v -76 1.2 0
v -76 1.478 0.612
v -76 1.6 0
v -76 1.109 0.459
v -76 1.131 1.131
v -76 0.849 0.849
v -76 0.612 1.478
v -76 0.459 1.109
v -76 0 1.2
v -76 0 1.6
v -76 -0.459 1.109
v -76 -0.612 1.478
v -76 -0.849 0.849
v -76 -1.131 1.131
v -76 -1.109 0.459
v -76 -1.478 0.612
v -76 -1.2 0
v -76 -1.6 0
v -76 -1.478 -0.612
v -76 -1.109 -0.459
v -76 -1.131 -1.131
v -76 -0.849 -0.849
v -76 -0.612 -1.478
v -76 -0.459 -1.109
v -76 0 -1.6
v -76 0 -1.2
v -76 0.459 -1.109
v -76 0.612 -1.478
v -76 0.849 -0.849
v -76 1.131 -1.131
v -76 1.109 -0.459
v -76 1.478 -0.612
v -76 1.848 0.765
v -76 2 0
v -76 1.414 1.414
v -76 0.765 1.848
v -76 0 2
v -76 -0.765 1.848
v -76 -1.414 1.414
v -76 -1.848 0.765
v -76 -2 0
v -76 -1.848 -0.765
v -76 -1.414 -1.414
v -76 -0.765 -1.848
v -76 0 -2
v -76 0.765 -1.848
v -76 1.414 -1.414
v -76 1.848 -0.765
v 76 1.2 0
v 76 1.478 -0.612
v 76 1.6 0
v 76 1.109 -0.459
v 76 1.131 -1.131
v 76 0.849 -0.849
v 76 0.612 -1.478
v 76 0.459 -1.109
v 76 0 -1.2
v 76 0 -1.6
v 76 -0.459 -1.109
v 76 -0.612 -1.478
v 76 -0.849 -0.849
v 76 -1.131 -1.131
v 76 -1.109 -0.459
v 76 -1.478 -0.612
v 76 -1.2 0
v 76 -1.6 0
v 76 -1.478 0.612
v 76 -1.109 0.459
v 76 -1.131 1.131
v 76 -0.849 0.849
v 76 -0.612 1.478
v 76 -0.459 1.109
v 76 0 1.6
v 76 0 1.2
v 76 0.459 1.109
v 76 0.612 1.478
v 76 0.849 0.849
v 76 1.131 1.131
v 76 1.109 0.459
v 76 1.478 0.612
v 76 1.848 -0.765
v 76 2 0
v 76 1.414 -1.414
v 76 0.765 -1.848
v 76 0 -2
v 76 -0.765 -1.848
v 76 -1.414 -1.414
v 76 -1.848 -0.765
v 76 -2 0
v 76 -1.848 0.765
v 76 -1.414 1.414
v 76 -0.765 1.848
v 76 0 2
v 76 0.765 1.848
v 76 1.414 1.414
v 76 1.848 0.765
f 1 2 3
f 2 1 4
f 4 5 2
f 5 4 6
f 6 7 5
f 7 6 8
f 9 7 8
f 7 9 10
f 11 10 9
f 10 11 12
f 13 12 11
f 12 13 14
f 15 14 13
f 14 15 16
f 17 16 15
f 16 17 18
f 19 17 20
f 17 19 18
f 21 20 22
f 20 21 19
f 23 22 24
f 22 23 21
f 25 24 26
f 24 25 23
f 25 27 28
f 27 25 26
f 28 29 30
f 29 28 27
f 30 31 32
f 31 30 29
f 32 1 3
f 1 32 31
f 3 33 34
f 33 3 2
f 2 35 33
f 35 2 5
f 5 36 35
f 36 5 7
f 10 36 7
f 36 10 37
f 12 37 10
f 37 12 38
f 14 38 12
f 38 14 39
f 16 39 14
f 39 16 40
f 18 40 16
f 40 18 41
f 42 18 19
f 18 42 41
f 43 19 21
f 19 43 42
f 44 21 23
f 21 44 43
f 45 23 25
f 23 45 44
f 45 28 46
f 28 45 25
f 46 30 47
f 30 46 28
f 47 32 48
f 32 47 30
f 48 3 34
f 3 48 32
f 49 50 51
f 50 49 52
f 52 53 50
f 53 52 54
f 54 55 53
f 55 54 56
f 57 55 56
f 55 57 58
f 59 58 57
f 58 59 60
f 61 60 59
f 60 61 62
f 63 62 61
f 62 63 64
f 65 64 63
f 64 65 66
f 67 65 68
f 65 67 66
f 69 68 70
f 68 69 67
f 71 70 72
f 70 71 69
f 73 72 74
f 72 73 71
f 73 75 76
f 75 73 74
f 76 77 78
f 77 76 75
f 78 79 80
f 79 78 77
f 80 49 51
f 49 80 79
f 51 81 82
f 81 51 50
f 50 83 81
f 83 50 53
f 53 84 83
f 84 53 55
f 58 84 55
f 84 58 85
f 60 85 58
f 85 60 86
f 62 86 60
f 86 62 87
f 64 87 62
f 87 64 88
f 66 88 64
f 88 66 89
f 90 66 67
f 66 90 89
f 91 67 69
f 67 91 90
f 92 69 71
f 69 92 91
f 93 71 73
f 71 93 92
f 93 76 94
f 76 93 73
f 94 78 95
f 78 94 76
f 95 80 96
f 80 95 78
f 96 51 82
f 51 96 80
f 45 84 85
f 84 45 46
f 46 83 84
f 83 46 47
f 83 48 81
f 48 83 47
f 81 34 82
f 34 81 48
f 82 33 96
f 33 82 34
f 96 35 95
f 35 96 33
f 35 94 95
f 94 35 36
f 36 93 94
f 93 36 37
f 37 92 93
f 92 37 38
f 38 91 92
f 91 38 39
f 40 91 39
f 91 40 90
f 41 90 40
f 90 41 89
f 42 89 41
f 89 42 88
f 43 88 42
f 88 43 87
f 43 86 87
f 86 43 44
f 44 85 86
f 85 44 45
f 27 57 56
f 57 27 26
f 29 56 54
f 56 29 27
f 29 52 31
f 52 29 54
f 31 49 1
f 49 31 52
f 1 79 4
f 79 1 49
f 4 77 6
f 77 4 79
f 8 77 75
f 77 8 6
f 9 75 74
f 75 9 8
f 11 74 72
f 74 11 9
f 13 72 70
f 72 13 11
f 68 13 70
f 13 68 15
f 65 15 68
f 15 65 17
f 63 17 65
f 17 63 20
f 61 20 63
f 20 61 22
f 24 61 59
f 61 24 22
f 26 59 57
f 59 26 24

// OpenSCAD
// file: ../p/4-4cyli.scad
use <../lib.scad>
function ldraw_lib__4_4cyli() = [
// 0 Cylinder 1.0
// 0 Name: 4-4cyli.dat
// 0 Author: James Jessiman
// 0 !LDRAW_ORG Primitive UPDATE 2005-01
// 0 !LICENSE Licensed under CC BY 2.0 and CC BY 4.0 : see CAreadme.txt
// 
// 0 BFC CERTIFY CCW
  [0,"BFC","CERTIFY"],
  [0,"BFC","CCW"],
// 
// 0 !HISTORY 1998-12-15 [PTadmin] Official Update 1998-10
// 0 !HISTORY 2002-03-23 [sbliss] Added BFC statement; merged headers from files in distributions LDraw 0.27 and Complete.
// 0 !HISTORY 2002-04-25 [PTadmin] Official Update 2002-02
// 0 !HISTORY 2004-12-14 [guyvivan] BFC CCW
// 0 !HISTORY 2005-12-28 [PTadmin] Official Update 2005-01
// 0 !HISTORY 2007-06-24 [PTadmin] Header formatted for Contributor Agreement
// 0 !HISTORY 2008-07-01 [PTadmin] Official Update 2008-01
// 
// 
// 4 16 1 1 0 0.9239 1 0.3827 0.9239 0 0.3827 1 0 0
  [4,16,1,1,0,0.9239,1,0.3827,0.9239,0,0.3827,1,0,0],
// 5 24 1 0 0 1 1 0 0.9239 0 0.3827 0.9239 0 -0.3827
  [5,24,1,0,0,1,1,0,0.9239,0,0.3827,0.9239,0,-0.3827],
// 4 16 0.9239 1 0.3827 0.7071 1 0.7071 0.7071 0 0.7071 0.9239 0 0.3827
  [4,16,0.9239,1,0.3827,0.7071,1,0.7071,0.7071,0,0.7071,0.9239,0,0.3827],
// 5 24 0.9239 0 0.3827 0.9239 1 0.3827 0.7071 0 0.7071 1 0 0
  [5,24,0.9239,0,0.3827,0.9239,1,0.3827,0.7071,0,0.7071,1,0,0],
// 4 16 0.7071 1 0.7071 0.3827 1 0.9239 0.3827 0 0.9239 0.7071 0 0.7071
  [4,16,0.7071,1,0.7071,0.3827,1,0.9239,0.3827,0,0.9239,0.7071,0,0.7071],
// 5 24 0.7071 0 0.7071 0.7071 1 0.7071 0.3827 0 0.9239 0.9239 0 0.3827
  [5,24,0.7071,0,0.7071,0.7071,1,0.7071,0.3827,0,0.9239,0.9239,0,0.3827],
// 4 16 0.3827 1 0.9239 0 1 1 0 0 1 0.3827 0 0.9239
  [4,16,0.3827,1,0.9239,0,1,1,0,0,1,0.3827,0,0.9239],
// 5 24 0.3827 0 0.9239 0.3827 1 0.9239 0 0 1 0.7071 0 0.7071
  [5,24,0.3827,0,0.9239,0.3827,1,0.9239,0,0,1,0.7071,0,0.7071],
// 4 16 0 1 1 -0.3827 1 0.9239 -0.3827 0 0.9239 0 0 1
  [4,16,0,1,1,-0.3827,1,0.9239,-0.3827,0,0.9239,0,0,1],
// 5 24 0 0 1 0 1 1 -0.3827 0 0.9239 0.3827 0 0.9239
  [5,24,0,0,1,0,1,1,-0.3827,0,0.9239,0.3827,0,0.9239],
// 4 16 -0.3827 1 0.9239 -0.7071 1 0.7071 -0.7071 0 0.7071 -0.3827 0 0.9239
  [4,16,-0.3827,1,0.9239,-0.7071,1,0.7071,-0.7071,0,0.7071,-0.3827,0,0.9239],
// 5 24 -0.3827 0 0.9239 -0.3827 1 0.9239 -0.7071 0 0.7071 0 0 1
  [5,24,-0.3827,0,0.9239,-0.3827,1,0.9239,-0.7071,0,0.7071,0,0,1],
// 4 16 -0.7071 1 0.7071 -0.9239 1 0.3827 -0.9239 0 0.3827 -0.7071 0 0.7071
  [4,16,-0.7071,1,0.7071,-0.9239,1,0.3827,-0.9239,0,0.3827,-0.7071,0,0.7071],
// 5 24 -0.7071 0 0.7071 -0.7071 1 0.7071 -0.9239 0 0.3827 -0.3827 0 0.9239
  [5,24,-0.7071,0,0.7071,-0.7071,1,0.7071,-0.9239,0,0.3827,-0.3827,0,0.9239],
// 4 16 -0.9239 1 0.3827 -1 1 0 -1 0 0 -0.9239 0 0.3827
  [4,16,-0.9239,1,0.3827,-1,1,0,-1,0,0,-0.9239,0,0.3827],
// 5 24 -0.9239 0 0.3827 -0.9239 1 0.3827 -1 0 0 -0.7071 0 0.7071
  [5,24,-0.9239,0,0.3827,-0.9239,1,0.3827,-1,0,0,-0.7071,0,0.7071],
// 4 16 -1 1 0 -0.9239 1 -0.3827 -0.9239 0 -0.3827 -1 0 0
  [4,16,-1,1,0,-0.9239,1,-0.3827,-0.9239,0,-0.3827,-1,0,0],
// 5 24 -1 0 0 -1 1 0 -0.9239 0 -0.3827 -0.9239 0 0.3827
  [5,24,-1,0,0,-1,1,0,-0.9239,0,-0.3827,-0.9239,0,0.3827],
// 4 16 -0.9239 1 -0.3827 -0.7071 1 -0.7071 -0.7071 0 -0.7071 -0.9239 0 -0.3827
  [4,16,-0.9239,1,-0.3827,-0.7071,1,-0.7071,-0.7071,0,-0.7071,-0.9239,0,-0.3827],
// 5 24 -0.9239 0 -0.3827 -0.9239 1 -0.3827 -0.7071 0 -0.7071 -1 0 0
  [5,24,-0.9239,0,-0.3827,-0.9239,1,-0.3827,-0.7071,0,-0.7071,-1,0,0],
// 4 16 -0.7071 1 -0.7071 -0.3827 1 -0.9239 -0.3827 0 -0.9239 -0.7071 0 -0.7071
  [4,16,-0.7071,1,-0.7071,-0.3827,1,-0.9239,-0.3827,0,-0.9239,-0.7071,0,-0.7071],
// 5 24 -0.7071 0 -0.7071 -0.7071 1 -0.7071 -0.3827 0 -0.9239 -0.9239 0 -0.3827
  [5,24,-0.7071,0,-0.7071,-0.7071,1,-0.7071,-0.3827,0,-0.9239,-0.9239,0,-0.3827],
// 4 16 -0.3827 1 -0.9239 0 1 -1 0 0 -1 -0.3827 0 -0.9239
  [4,16,-0.3827,1,-0.9239,0,1,-1,0,0,-1,-0.3827,0,-0.9239],
// 5 24 -0.3827 0 -0.9239 -0.3827 1 -0.9239 0 0 -1 -0.7071 0 -0.7071
  [5,24,-0.3827,0,-0.9239,-0.3827,1,-0.9239,0,0,-1,-0.7071,0,-0.7071],
// 4 16 0 1 -1 0.3827 1 -0.9239 0.3827 0 -0.9239 0 0 -1
  [4,16,0,1,-1,0.3827,1,-0.9239,0.3827,0,-0.9239,0,0,-1],
// 5 24 0 0 -1 0 1 -1 0.3827 0 -0.9239 -0.3827 0 -0.9239
  [5,24,0,0,-1,0,1,-1,0.3827,0,-0.9239,-0.3827,0,-0.9239],
// 4 16 0.3827 1 -0.9239 0.7071 1 -0.7071 0.7071 0 -0.7071 0.3827 0 -0.9239
  [4,16,0.3827,1,-0.9239,0.7071,1,-0.7071,0.7071,0,-0.7071,0.3827,0,-0.9239],
// 5 24 0.3827 0 -0.9239 0.3827 1 -0.9239 0.7071 0 -0.7071 0 0 -1
  [5,24,0.3827,0,-0.9239,0.3827,1,-0.9239,0.7071,0,-0.7071,0,0,-1],
// 4 16 0.7071 1 -0.7071 0.9239 1 -0.3827 0.9239 0 -0.3827 0.7071 0 -0.7071
  [4,16,0.7071,1,-0.7071,0.9239,1,-0.3827,0.9239,0,-0.3827,0.7071,0,-0.7071],
// 5 24 0.7071 0 -0.7071 0.7071 1 -0.7071 0.9239 0 -0.3827 0.3827 0 -0.9239
  [5,24,0.7071,0,-0.7071,0.7071,1,-0.7071,0.9239,0,-0.3827,0.3827,0,-0.9239],
// 4 16 0.9239 1 -0.3827 1 1 0 1 0 0 0.9239 0 -0.3827
  [4,16,0.9239,1,-0.3827,1,1,0,1,0,0,0.9239,0,-0.3827],
// 5 24 0.9239 0 -0.3827 0.9239 1 -0.3827 1 0 0 0.7071 0 -0.7071
  [5,24,0.9239,0,-0.3827,0.9239,1,-0.3827,1,0,0,0.7071,0,-0.7071],
// 0
];
makepoly(ldraw_lib__4_4cyli(), line=0.2);
// file: ../p/4-4ring4.scad
use <../lib.scad>
function ldraw_lib__4_4ring4() = [
// 0 Ring  4 x 1.0
// 0 Name: 4-4ring4.dat
// 0 Author: James Jessiman
// 0 !LDRAW_ORG Primitive UPDATE 2009-01
// 0 !LICENSE Licensed under CC BY 2.0 and CC BY 4.0 : see CAreadme.txt
// 
// 0 BFC CERTIFY CCW
  [0,"BFC","CERTIFY"],
  [0,"BFC","CCW"],
// 
// 0 !HISTORY 1998-12-15 [PTadmin] Official Update 1998-10
// 0 !HISTORY 2002-04-08 [BrickCaster] Modified for BFC compliance
// 0 !HISTORY 2002-04-25 [PTadmin] Official Update 2002-02
// 0 !HISTORY 2007-06-24 [PTadmin] Header formatted for Contributor Agreement
// 0 !HISTORY 2008-07-01 [PTadmin] Official Update 2008-01
// 0 !HISTORY 2008-08-26 [cwdee] Switch polygon winding and rename
// 0 !HISTORY 2009-05-02 [PTadmin] Official Update 2009-01
// 
// 
// 4 16 -1.9135 0 4.6195 -1.5308 0 3.6956 0 0 4 0 0 5
  [4,16,-1.9135,0,4.6195,-1.5308,0,3.6956,0,0,4,0,0,5],
// 4 16 -3.5355 0 3.5355 -2.8284 0 2.8284 -1.5308 0 3.6956 -1.9135 0 4.6195
  [4,16,-3.5355,0,3.5355,-2.8284,0,2.8284,-1.5308,0,3.6956,-1.9135,0,4.6195],
// 4 16 -4.6195 0 1.9135 -3.6956 0 1.5308 -2.8284 0 2.8284 -3.5355 0 3.5355
  [4,16,-4.6195,0,1.9135,-3.6956,0,1.5308,-2.8284,0,2.8284,-3.5355,0,3.5355],
// 4 16 -5 0 0 -4 0 0 -3.6956 0 1.5308 -4.6195 0 1.9135
  [4,16,-5,0,0,-4,0,0,-3.6956,0,1.5308,-4.6195,0,1.9135],
// 4 16 -4.6195 0 -1.9135 -3.6956 0 -1.5308 -4 0 0 -5 0 0
  [4,16,-4.6195,0,-1.9135,-3.6956,0,-1.5308,-4,0,0,-5,0,0],
// 4 16 -3.5355 0 -3.5355 -2.8284 0 -2.8284 -3.6956 0 -1.5308 -4.6195 0 -1.9135
  [4,16,-3.5355,0,-3.5355,-2.8284,0,-2.8284,-3.6956,0,-1.5308,-4.6195,0,-1.9135],
// 4 16 -1.9135 0 -4.6195 -1.5308 0 -3.6956 -2.8284 0 -2.8284 -3.5355 0 -3.5355
  [4,16,-1.9135,0,-4.6195,-1.5308,0,-3.6956,-2.8284,0,-2.8284,-3.5355,0,-3.5355],
// 4 16 0 0 -5 0 0 -4 -1.5308 0 -3.6956 -1.9135 0 -4.6195
  [4,16,0,0,-5,0,0,-4,-1.5308,0,-3.6956,-1.9135,0,-4.6195],
// 4 16 1.9135 0 -4.6195 1.5308 0 -3.6956 0 0 -4 0 0 -5
  [4,16,1.9135,0,-4.6195,1.5308,0,-3.6956,0,0,-4,0,0,-5],
// 4 16 3.5355 0 -3.5355 2.8284 0 -2.8284 1.5308 0 -3.6956 1.9135 0 -4.6195
  [4,16,3.5355,0,-3.5355,2.8284,0,-2.8284,1.5308,0,-3.6956,1.9135,0,-4.6195],
// 4 16 4.6195 0 -1.9135 3.6956 0 -1.5308 2.8284 0 -2.8284 3.5355 0 -3.5355
  [4,16,4.6195,0,-1.9135,3.6956,0,-1.5308,2.8284,0,-2.8284,3.5355,0,-3.5355],
// 4 16 5 0 0 4 0 0 3.6956 0 -1.5308 4.6195 0 -1.9135
  [4,16,5,0,0,4,0,0,3.6956,0,-1.5308,4.6195,0,-1.9135],
// 4 16 4.6195 0 1.9135 3.6956 0 1.5308 4 0 0 5 0 0
  [4,16,4.6195,0,1.9135,3.6956,0,1.5308,4,0,0,5,0,0],
// 4 16 3.5355 0 3.5355 2.8284 0 2.8284 3.6956 0 1.5308 4.6195 0 1.9135
  [4,16,3.5355,0,3.5355,2.8284,0,2.8284,3.6956,0,1.5308,4.6195,0,1.9135],
// 4 16 1.9135 0 4.6195 1.5308 0 3.6956 2.8284 0 2.8284 3.5355 0 3.5355
  [4,16,1.9135,0,4.6195,1.5308,0,3.6956,2.8284,0,2.8284,3.5355,0,3.5355],
// 4 16 0 0 5 0 0 4 1.5308 0 3.6956 1.9135 0 4.6195
  [4,16,0,0,5,0,0,4,1.5308,0,3.6956,1.9135,0,4.6195],
// 0
];
makepoly(ldraw_lib__4_4ring4(), line=0.2);
// file: ../p/4-4ring3.scad
use <../lib.scad>
function ldraw_lib__4_4ring3() = [
// 0 Ring  3 x 1.0
// 0 Name: 4-4ring3.dat
// 0 Author: James Jessiman
// 0 !LDRAW_ORG Primitive UPDATE 2009-01
// 0 !LICENSE Licensed under CC BY 2.0 and CC BY 4.0 : see CAreadme.txt
// 
// 0 BFC CERTIFY CCW
  [0,"BFC","CERTIFY"],
  [0,"BFC","CCW"],
// 
// 0 !HISTORY 1998-12-15 [PTadmin] Official Update 1998-10
// 0 !HISTORY 2002-04-05 [hafhead] Added BFC statement
// 0 !HISTORY 2002-04-25 [PTadmin] Official Update 2002-02
// 0 !HISTORY 2007-06-24 [PTadmin] Header formatted for Contributor Agreement
// 0 !HISTORY 2008-07-01 [PTadmin] Official Update 2008-01
// 0 !HISTORY 2008-08-26 [cwdee] Switch polygon winding and rename
// 0 !HISTORY 2009-05-02 [PTadmin] Official Update 2009-01
// 
// 
// 4 16 -1.5308 0 3.6956 -1.1481 0 2.7717 0 0 3 0 0 4
  [4,16,-1.5308,0,3.6956,-1.1481,0,2.7717,0,0,3,0,0,4],
// 4 16 -2.8284 0 2.8284 -2.1213 0 2.1213 -1.1481 0 2.7717 -1.5308 0 3.6956
  [4,16,-2.8284,0,2.8284,-2.1213,0,2.1213,-1.1481,0,2.7717,-1.5308,0,3.6956],
// 4 16 -3.6956 0 1.5308 -2.7717 0 1.1481 -2.1213 0 2.1213 -2.8284 0 2.8284
  [4,16,-3.6956,0,1.5308,-2.7717,0,1.1481,-2.1213,0,2.1213,-2.8284,0,2.8284],
// 4 16 -4 0 0 -3 0 0 -2.7717 0 1.1481 -3.6956 0 1.5308
  [4,16,-4,0,0,-3,0,0,-2.7717,0,1.1481,-3.6956,0,1.5308],
// 4 16 -3.6956 0 -1.5308 -2.7717 0 -1.1481 -3 0 0 -4 0 0
  [4,16,-3.6956,0,-1.5308,-2.7717,0,-1.1481,-3,0,0,-4,0,0],
// 4 16 -2.8284 0 -2.8284 -2.1213 0 -2.1213 -2.7717 0 -1.1481 -3.6956 0 -1.5308
  [4,16,-2.8284,0,-2.8284,-2.1213,0,-2.1213,-2.7717,0,-1.1481,-3.6956,0,-1.5308],
// 4 16 -1.5308 0 -3.6956 -1.1481 0 -2.7717 -2.1213 0 -2.1213 -2.8284 0 -2.8284
  [4,16,-1.5308,0,-3.6956,-1.1481,0,-2.7717,-2.1213,0,-2.1213,-2.8284,0,-2.8284],
// 4 16 0 0 -4 0 0 -3 -1.1481 0 -2.7717 -1.5308 0 -3.6956
  [4,16,0,0,-4,0,0,-3,-1.1481,0,-2.7717,-1.5308,0,-3.6956],
// 4 16 1.5308 0 -3.6956 1.1481 0 -2.7717 0 0 -3 0 0 -4
  [4,16,1.5308,0,-3.6956,1.1481,0,-2.7717,0,0,-3,0,0,-4],
// 4 16 2.8284 0 -2.8284 2.1213 0 -2.1213 1.1481 0 -2.7717 1.5308 0 -3.6956
  [4,16,2.8284,0,-2.8284,2.1213,0,-2.1213,1.1481,0,-2.7717,1.5308,0,-3.6956],
// 4 16 3.6956 0 -1.5308 2.7717 0 -1.1481 2.1213 0 -2.1213 2.8284 0 -2.8284
  [4,16,3.6956,0,-1.5308,2.7717,0,-1.1481,2.1213,0,-2.1213,2.8284,0,-2.8284],
// 4 16 4 0 0 3 0 0 2.7717 0 -1.1481 3.6956 0 -1.5308
  [4,16,4,0,0,3,0,0,2.7717,0,-1.1481,3.6956,0,-1.5308],
// 4 16 3.6956 0 1.5308 2.7717 0 1.1481 3 0 0 4 0 0
  [4,16,3.6956,0,1.5308,2.7717,0,1.1481,3,0,0,4,0,0],
// 4 16 2.8284 0 2.8284 2.1213 0 2.1213 2.7717 0 1.1481 3.6956 0 1.5308
  [4,16,2.8284,0,2.8284,2.1213,0,2.1213,2.7717,0,1.1481,3.6956,0,1.5308],
// 4 16 1.5308 0 3.6956 1.1481 0 2.7717 2.1213 0 2.1213 2.8284 0 2.8284
  [4,16,1.5308,0,3.6956,1.1481,0,2.7717,2.1213,0,2.1213,2.8284,0,2.8284],
// 4 16 0 0 4 0 0 3 1.1481 0 2.7717 1.5308 0 3.6956
  [4,16,0,0,4,0,0,3,1.1481,0,2.7717,1.5308,0,3.6956],
// 0
];
makepoly(ldraw_lib__4_4ring3(), line=0.2);
// file: ../p/4-4edge.scad
use <../lib.scad>
function ldraw_lib__4_4edge() = [
// 0 Circle 1.0
// 0 Name: 4-4edge.dat
// 0 Author: James Jessiman
// 0 !LDRAW_ORG Primitive UPDATE 2017-01
// 0 !LICENSE Licensed under CC BY 2.0 and CC BY 4.0 : see CAreadme.txt
// 
// 0 BFC CERTIFY CCW
  [0,"BFC","CERTIFY"],
  [0,"BFC","CCW"],
// 
// 0 !HISTORY 1998-12-15 [PTadmin] Official Update 1998-10
// 0 !HISTORY 2005-12-28 [PTadmin] Official Update 2005-01
// 0 !HISTORY 2007-06-24 [PTadmin] Header formatted for Contributor Agreement
// 0 !HISTORY 2008-07-01 [PTadmin] Official Update 2008-01
// 0 !HISTORY 2017-01-15 [Steffen] BFCed
// 0 !HISTORY 2017-12-30 [PTadmin] Official Update 2017-01
// 
// 
// 2 24 1 0 0 0.9239 0 0.3827
  [2,24,1,0,0,0.9239,0,0.3827],
// 2 24 0.9239 0 0.3827 0.7071 0 0.7071
  [2,24,0.9239,0,0.3827,0.7071,0,0.7071],
// 2 24 0.7071 0 0.7071 0.3827 0 0.9239
  [2,24,0.7071,0,0.7071,0.3827,0,0.9239],
// 2 24 0.3827 0 0.9239 0 0 1
  [2,24,0.3827,0,0.9239,0,0,1],
// 2 24 0 0 1 -0.3827 0 0.9239
  [2,24,0,0,1,-0.3827,0,0.9239],
// 2 24 -0.3827 0 0.9239 -0.7071 0 0.7071
  [2,24,-0.3827,0,0.9239,-0.7071,0,0.7071],
// 2 24 -0.7071 0 0.7071 -0.9239 0 0.3827
  [2,24,-0.7071,0,0.7071,-0.9239,0,0.3827],
// 2 24 -0.9239 0 0.3827 -1 0 -0
  [2,24,-0.9239,0,0.3827,-1,0,-0],
// 2 24 -1 0 -0 -0.9239 0 -0.3827
  [2,24,-1,0,-0,-0.9239,0,-0.3827],
// 2 24 -0.9239 0 -0.3827 -0.7071 0 -0.7071
  [2,24,-0.9239,0,-0.3827,-0.7071,0,-0.7071],
// 2 24 -0.7071 0 -0.7071 -0.3827 0 -0.9239
  [2,24,-0.7071,0,-0.7071,-0.3827,0,-0.9239],
// 2 24 -0.3827 0 -0.9239 0 0 -1
  [2,24,-0.3827,0,-0.9239,0,0,-1],
// 2 24 0 0 -1 0.3827 0 -0.9239
  [2,24,0,0,-1,0.3827,0,-0.9239],
// 2 24 0.3827 0 -0.9239 0.7071 0 -0.7071
  [2,24,0.3827,0,-0.9239,0.7071,0,-0.7071],
// 2 24 0.7071 0 -0.7071 0.9239 0 -0.3827
  [2,24,0.7071,0,-0.7071,0.9239,0,-0.3827],
// 2 24 0.9239 0 -0.3827 1 0 0
  [2,24,0.9239,0,-0.3827,1,0,0],
];
makepoly(ldraw_lib__4_4edge(), line=0.2);
// file: 71533k03.scad
use <../lib.scad>
use <../p/4-4cyli.scad>
function ldraw_lib__71533k03() = [
// 0 ~Technic Pneumatic Tube Segment
// 0 Name: 71533k03.dat
// 0 Author: Jaco van der Molen [Jaco]
// 0 !LDRAW_ORG Part Flexible_Section UPDATE 2020-01
// 0 !LICENSE Licensed under CC BY 2.0 and CC BY 4.0 : see CAreadme.txt
// 
// 0 BFC CERTIFY CW
  [0,"BFC","CERTIFY"],
  [0,"BFC","CW"],
// 
// 0 !HISTORY 2003-11-30 [Steffen] BFCed
// 0 !HISTORY 2009-12-29 [PTadmin] Official Update 2009-03
// 0 !HISTORY 2020-06-27 [PTadmin] Renamed from 166
// 0 !HISTORY 2020-06-28 [PTadmin] Official Update 2020-01
// 
// 
// 1 16 0 0 0 5 0 0 0 1 0 0 0 5 4-4cyli.dat
  [1,16,0,0,0,5,0,0,0,1,0,0,0,5, ldraw_lib__4_4cyli()],
// 0 BFC INVERTNEXT
  [0,"BFC","INVERTNEXT"],
// 1 16 0 0 0 3 0 0 0 1 0 0 0 3 4-4cyli.dat
  [1,16,0,0,0,3,0,0,0,1,0,0,0,3, ldraw_lib__4_4cyli()],
// 0
];
makepoly(ldraw_lib__71533k03(), line=0.2);
// file: 71533k02.scad
use <../lib.scad>
use <../p/4-4edge.scad>
use <../p/4-4ring3.scad>
use <../p/4-4ring4.scad>
function ldraw_lib__71533k02() = [
// 0 ~Technic Pneumatic Tube End (Non-Bulged)
// 0 Name: 71533k02.dat
// 0 Author: Steffen [Steffen]
// 0 !LDRAW_ORG Part Flexible_Section UPDATE 2020-01
// 0 !LICENSE Licensed under CC BY 2.0 and CC BY 4.0 : see CAreadme.txt
// 
// 0 BFC CERTIFY CCW
  [0,"BFC","CERTIFY"],
  [0,"BFC","CCW"],
// 
// 0 !HISTORY 2020-06-28 [PTadmin] Official Update 2020-01
// 
// 
// 0 // This file goes together with 71533k01.dat and 71533k03.dat.
// 0 // Those 3 files can be used to create Technic Pneumatic Tubes
// 0 // with either bulged or non-bulged ends.
// 
// 1 16 0 0 0 1 0 0 0 1 0 0 0 1 4-4ring3.dat
  [1,16,0,0,0,1,0,0,0,1,0,0,0,1, ldraw_lib__4_4ring3()],
// 1 16 0 0 0 1 0 0 0 1 0 0 0 1 4-4ring4.dat
  [1,16,0,0,0,1,0,0,0,1,0,0,0,1, ldraw_lib__4_4ring4()],
// 1 16 0 0 0 3 0 0 0 3 0 0 0 3 4-4edge.dat
  [1,16,0,0,0,3,0,0,0,3,0,0,0,3, ldraw_lib__4_4edge()],
// 1 16 0 0 0 5 0 0 0 5 0 0 0 5 4-4edge.dat
  [1,16,0,0,0,5,0,0,0,5,0,0,0,5, ldraw_lib__4_4edge()],
];
makepoly(ldraw_lib__71533k02(), line=0.2);
// main file
use <../lib.scad>
use <71533k02.scad>
use <71533k03.scad>
function ldraw_lib__21839_f1() = [
// 0 Technic Pneumatic Tube 19L
// 0 Name: 21839-f1.dat
// 0 Author: Philippe Hurbain [Philo]
// 0 !LDRAW_ORG Part UPDATE 2020-02
// 0 !LICENSE Licensed under CC BY 2.0 and CC BY 4.0 : see CAreadme.txt
// 
// 0 BFC CERTIFY CCW
  [0,"BFC","CERTIFY"],
  [0,"BFC","CCW"],
// 
// 0 !KEYWORDS 152 mm
// 
// 0 !HISTORY 2020-09-05 [PTadmin] Official Update 2020-02
// 
// 
// 1 16 -190 0 0 0 1 0 1 0 0 0 0 1 71533k02.dat
  [1,16,-190,0,0,0,1,0,1,0,0,0,0,1, ldraw_lib__71533k02()],
// 1 16 190 0 0 0 -1 0 -1 0 0 0 0 1 71533k02.dat
  [1,16,190,0,0,0,-1,0,-1,0,0,0,0,1, ldraw_lib__71533k02()],
// 1 16 -190 0 0 0 380 0 1 0 0 0 0 1 71533k03.dat
  [1,16,-190,0,0,0,380,0,1,0,0,0,0,1, ldraw_lib__71533k03()],
];
makepoly(ldraw_lib__21839_f1(), line=0.2);
